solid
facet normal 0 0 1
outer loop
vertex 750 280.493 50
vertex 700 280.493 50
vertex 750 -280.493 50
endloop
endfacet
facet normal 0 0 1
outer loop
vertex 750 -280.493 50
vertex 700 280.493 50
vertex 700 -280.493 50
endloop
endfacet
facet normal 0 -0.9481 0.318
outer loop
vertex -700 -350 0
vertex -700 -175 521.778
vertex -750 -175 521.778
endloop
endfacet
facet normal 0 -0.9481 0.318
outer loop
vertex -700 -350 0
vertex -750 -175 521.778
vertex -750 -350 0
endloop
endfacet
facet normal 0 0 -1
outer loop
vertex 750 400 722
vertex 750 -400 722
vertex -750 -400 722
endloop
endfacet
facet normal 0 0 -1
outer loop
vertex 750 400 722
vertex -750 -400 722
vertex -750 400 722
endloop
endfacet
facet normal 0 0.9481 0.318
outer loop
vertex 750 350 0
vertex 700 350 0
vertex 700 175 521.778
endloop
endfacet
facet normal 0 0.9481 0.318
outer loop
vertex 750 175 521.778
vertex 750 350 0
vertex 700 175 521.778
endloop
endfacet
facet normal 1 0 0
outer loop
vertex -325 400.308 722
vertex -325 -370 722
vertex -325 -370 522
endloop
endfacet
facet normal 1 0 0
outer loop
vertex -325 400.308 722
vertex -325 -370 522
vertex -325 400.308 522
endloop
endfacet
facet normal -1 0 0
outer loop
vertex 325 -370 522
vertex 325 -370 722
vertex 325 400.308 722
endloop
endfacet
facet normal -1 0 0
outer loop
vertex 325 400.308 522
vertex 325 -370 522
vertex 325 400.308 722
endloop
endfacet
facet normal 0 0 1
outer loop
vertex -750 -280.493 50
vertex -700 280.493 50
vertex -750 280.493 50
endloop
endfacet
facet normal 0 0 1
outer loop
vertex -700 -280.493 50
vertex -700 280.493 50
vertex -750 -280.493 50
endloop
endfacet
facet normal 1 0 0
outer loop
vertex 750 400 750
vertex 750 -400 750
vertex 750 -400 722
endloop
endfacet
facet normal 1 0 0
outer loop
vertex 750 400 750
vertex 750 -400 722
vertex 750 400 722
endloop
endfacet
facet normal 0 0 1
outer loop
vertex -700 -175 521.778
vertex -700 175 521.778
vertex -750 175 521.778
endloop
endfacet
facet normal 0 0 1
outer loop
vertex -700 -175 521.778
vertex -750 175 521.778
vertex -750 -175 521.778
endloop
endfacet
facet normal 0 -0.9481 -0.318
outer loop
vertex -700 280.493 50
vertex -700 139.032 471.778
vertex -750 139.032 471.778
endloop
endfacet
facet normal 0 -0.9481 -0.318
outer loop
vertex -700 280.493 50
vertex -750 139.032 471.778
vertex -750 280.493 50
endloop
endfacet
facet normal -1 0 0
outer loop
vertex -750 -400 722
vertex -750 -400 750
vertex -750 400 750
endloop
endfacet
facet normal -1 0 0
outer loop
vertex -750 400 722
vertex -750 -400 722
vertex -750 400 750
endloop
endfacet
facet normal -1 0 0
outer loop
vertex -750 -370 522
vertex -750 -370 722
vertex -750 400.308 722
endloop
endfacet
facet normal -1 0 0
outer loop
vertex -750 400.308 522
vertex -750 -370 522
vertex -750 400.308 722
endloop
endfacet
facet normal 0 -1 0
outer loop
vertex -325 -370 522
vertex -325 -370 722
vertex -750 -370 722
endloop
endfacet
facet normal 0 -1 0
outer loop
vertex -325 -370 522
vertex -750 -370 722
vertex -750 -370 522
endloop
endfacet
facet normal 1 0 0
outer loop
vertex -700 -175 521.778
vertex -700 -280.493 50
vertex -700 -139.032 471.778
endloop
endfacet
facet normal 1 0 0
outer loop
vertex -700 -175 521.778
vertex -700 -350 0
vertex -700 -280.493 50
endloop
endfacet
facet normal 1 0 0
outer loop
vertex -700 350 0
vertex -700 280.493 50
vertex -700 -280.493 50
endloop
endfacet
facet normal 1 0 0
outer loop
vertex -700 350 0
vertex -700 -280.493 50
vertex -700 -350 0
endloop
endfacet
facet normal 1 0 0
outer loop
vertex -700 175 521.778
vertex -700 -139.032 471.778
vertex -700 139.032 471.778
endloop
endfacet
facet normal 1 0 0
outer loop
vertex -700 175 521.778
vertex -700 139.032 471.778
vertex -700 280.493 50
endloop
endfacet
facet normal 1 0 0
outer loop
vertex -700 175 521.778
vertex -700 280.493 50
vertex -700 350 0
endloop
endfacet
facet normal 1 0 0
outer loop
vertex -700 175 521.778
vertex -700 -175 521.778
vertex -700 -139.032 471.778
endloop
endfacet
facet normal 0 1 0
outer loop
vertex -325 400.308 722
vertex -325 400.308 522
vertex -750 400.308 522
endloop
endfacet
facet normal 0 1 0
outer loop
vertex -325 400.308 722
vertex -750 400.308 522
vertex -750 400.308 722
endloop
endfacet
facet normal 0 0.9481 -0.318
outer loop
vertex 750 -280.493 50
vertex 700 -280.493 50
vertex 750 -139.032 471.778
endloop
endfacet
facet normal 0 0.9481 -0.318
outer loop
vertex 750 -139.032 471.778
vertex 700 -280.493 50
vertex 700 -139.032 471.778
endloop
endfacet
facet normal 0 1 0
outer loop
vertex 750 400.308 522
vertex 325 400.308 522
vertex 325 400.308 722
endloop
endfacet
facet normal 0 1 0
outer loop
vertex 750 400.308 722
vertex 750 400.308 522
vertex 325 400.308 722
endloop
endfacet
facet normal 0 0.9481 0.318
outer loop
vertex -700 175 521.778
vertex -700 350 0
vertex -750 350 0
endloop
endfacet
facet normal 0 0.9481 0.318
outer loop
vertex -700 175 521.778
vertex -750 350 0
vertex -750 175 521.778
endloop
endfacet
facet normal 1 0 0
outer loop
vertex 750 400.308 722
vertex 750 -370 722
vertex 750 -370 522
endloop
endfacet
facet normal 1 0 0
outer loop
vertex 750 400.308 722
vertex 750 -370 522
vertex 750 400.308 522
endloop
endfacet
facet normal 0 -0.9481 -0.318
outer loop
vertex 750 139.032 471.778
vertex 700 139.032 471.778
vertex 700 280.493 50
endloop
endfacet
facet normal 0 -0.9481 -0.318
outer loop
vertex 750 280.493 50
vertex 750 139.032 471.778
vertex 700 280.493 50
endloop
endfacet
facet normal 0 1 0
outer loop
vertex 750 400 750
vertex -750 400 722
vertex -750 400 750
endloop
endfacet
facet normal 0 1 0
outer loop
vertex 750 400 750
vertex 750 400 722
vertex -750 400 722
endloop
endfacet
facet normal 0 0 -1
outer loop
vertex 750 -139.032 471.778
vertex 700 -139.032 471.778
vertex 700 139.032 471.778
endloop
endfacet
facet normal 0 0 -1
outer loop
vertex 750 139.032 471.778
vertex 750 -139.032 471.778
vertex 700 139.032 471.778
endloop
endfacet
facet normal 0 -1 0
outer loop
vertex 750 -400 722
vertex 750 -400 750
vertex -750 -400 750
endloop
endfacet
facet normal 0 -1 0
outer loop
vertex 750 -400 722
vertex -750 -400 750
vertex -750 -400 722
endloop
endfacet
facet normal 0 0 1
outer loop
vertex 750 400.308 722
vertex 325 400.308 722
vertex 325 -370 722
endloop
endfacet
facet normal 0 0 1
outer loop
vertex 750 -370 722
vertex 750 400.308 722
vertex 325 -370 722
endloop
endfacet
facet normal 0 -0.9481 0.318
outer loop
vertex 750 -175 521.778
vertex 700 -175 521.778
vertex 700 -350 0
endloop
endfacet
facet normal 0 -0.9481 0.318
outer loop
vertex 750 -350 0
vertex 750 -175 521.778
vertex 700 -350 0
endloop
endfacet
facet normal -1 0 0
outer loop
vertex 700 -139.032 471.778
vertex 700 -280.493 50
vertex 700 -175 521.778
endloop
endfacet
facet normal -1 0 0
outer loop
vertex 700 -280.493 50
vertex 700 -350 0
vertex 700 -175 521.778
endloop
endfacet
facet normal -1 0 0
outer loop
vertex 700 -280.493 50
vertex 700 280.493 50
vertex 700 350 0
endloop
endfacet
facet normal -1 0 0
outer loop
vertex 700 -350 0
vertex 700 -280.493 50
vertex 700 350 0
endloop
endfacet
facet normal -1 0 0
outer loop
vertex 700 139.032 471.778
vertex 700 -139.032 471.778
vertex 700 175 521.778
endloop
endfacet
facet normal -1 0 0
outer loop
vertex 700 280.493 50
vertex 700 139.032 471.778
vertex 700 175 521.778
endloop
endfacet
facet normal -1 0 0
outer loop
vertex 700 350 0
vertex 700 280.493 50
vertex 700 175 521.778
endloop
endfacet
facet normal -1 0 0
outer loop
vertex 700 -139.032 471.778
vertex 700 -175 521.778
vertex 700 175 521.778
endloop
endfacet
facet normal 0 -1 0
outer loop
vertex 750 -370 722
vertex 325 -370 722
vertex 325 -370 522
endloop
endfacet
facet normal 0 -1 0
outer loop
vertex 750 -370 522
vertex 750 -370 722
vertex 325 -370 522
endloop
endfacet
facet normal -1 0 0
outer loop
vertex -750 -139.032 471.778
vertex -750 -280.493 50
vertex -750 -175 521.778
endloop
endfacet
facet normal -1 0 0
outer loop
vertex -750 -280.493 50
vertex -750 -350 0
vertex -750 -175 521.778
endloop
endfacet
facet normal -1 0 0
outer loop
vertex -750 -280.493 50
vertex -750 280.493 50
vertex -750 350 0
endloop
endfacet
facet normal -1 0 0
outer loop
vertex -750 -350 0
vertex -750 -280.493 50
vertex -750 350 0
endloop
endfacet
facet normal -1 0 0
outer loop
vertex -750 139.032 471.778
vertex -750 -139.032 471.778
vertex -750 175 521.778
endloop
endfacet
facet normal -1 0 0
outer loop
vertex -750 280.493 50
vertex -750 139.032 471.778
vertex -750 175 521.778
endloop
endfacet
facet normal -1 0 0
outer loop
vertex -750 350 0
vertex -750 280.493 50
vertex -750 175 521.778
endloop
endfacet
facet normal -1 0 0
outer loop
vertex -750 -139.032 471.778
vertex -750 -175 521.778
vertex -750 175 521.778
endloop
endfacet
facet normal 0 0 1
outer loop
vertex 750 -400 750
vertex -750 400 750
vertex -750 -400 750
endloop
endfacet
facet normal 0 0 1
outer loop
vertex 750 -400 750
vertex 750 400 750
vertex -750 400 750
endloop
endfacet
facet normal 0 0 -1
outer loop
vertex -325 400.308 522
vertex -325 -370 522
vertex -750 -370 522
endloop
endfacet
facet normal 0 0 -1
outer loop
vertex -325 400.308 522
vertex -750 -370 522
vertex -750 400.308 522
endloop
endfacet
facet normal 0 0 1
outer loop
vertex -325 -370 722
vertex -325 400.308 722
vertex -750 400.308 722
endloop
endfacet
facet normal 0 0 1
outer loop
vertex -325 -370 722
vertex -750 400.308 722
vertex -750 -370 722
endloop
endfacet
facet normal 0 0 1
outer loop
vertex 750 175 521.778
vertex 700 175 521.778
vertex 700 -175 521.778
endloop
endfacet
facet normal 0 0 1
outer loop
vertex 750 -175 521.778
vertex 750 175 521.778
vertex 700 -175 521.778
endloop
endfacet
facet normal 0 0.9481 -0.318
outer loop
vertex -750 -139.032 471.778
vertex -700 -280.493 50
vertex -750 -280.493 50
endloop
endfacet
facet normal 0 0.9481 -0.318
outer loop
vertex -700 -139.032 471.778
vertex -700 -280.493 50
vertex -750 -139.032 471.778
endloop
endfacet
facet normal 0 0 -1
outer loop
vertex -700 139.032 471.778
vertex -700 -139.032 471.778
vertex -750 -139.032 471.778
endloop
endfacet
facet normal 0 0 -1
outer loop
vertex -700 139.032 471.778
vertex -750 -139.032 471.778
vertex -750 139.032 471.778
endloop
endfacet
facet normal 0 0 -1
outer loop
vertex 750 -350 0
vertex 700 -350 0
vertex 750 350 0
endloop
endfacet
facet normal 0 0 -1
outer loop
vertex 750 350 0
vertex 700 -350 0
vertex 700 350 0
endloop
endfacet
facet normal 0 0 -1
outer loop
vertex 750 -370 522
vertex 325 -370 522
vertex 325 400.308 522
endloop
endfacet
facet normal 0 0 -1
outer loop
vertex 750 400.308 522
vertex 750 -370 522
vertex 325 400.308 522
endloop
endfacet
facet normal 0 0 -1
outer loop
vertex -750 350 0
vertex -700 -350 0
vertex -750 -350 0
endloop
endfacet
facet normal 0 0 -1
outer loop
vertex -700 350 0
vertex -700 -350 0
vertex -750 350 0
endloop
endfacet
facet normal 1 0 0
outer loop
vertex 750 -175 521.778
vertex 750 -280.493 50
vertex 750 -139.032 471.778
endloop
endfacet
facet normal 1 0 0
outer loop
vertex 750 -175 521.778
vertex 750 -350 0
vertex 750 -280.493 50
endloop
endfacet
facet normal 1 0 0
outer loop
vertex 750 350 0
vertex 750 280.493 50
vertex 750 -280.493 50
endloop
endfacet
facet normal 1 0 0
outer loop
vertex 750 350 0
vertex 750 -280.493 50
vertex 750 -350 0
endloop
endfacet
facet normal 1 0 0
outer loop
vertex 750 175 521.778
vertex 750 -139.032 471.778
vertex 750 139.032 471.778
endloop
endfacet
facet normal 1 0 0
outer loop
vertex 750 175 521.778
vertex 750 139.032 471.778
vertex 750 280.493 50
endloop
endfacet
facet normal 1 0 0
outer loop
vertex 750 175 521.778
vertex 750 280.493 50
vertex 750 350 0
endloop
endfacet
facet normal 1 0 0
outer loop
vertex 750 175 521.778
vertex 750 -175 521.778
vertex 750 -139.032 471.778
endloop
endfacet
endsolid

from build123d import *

# Parameters (mm, degrees)
F2_DEPTH = 750
F3_START = 700
F3_DEPTH = 50
F5_START = 325
F5_DEPTH = 425


with BuildPart() as f2:
    # F1 (on Right) → F2 (new body)
    with BuildSketch(Plane.YZ):
        Polygon((400, 750), (-400, 750), (-400, 722), (-370, 722), (400, 722), align=None)
    extrude(amount=F2_DEPTH)

    # F4: F2, F3 across plane


with BuildPart() as f3:
    # F1 (on Right) → F3 (new body)
    with BuildSketch(Plane.YZ.offset(F3_START)):
        Polygon((175, 521.7778058052), (-175, 521.7778058052), (-350, 0), (350, 0), align=None)
        Polygon((-280.4931444071, 50), (-139.0323248883, 471.7778058052), (139.0323248883, 471.7778058052), (280.4931444071, 50), align=None, mode=Mode.SUBTRACT)
    extrude(amount=F3_DEPTH)


with BuildPart() as f2_1:
    add(f2.part)
    add(f2.part.mirror(Plane.YZ))
    add(f3.part.mirror(Plane.YZ))


with BuildPart() as f5:
    # F1 (on Right) → F5 (new body)
    with BuildSketch(Plane.YZ.offset(F5_START)):
        Polygon((400.3083109856, 722), (400, 722), (-370, 722), (-370, 522), (400.3083109856, 522), align=None)
    extrude(amount=F5_DEPTH)


with BuildPart() as f6_1:
    # F6: instance of F5
    add(f5.part.mirror(Plane.YZ))


solid = Compound([f3.part, f2_1.part, f5.part, f6_1.part])
